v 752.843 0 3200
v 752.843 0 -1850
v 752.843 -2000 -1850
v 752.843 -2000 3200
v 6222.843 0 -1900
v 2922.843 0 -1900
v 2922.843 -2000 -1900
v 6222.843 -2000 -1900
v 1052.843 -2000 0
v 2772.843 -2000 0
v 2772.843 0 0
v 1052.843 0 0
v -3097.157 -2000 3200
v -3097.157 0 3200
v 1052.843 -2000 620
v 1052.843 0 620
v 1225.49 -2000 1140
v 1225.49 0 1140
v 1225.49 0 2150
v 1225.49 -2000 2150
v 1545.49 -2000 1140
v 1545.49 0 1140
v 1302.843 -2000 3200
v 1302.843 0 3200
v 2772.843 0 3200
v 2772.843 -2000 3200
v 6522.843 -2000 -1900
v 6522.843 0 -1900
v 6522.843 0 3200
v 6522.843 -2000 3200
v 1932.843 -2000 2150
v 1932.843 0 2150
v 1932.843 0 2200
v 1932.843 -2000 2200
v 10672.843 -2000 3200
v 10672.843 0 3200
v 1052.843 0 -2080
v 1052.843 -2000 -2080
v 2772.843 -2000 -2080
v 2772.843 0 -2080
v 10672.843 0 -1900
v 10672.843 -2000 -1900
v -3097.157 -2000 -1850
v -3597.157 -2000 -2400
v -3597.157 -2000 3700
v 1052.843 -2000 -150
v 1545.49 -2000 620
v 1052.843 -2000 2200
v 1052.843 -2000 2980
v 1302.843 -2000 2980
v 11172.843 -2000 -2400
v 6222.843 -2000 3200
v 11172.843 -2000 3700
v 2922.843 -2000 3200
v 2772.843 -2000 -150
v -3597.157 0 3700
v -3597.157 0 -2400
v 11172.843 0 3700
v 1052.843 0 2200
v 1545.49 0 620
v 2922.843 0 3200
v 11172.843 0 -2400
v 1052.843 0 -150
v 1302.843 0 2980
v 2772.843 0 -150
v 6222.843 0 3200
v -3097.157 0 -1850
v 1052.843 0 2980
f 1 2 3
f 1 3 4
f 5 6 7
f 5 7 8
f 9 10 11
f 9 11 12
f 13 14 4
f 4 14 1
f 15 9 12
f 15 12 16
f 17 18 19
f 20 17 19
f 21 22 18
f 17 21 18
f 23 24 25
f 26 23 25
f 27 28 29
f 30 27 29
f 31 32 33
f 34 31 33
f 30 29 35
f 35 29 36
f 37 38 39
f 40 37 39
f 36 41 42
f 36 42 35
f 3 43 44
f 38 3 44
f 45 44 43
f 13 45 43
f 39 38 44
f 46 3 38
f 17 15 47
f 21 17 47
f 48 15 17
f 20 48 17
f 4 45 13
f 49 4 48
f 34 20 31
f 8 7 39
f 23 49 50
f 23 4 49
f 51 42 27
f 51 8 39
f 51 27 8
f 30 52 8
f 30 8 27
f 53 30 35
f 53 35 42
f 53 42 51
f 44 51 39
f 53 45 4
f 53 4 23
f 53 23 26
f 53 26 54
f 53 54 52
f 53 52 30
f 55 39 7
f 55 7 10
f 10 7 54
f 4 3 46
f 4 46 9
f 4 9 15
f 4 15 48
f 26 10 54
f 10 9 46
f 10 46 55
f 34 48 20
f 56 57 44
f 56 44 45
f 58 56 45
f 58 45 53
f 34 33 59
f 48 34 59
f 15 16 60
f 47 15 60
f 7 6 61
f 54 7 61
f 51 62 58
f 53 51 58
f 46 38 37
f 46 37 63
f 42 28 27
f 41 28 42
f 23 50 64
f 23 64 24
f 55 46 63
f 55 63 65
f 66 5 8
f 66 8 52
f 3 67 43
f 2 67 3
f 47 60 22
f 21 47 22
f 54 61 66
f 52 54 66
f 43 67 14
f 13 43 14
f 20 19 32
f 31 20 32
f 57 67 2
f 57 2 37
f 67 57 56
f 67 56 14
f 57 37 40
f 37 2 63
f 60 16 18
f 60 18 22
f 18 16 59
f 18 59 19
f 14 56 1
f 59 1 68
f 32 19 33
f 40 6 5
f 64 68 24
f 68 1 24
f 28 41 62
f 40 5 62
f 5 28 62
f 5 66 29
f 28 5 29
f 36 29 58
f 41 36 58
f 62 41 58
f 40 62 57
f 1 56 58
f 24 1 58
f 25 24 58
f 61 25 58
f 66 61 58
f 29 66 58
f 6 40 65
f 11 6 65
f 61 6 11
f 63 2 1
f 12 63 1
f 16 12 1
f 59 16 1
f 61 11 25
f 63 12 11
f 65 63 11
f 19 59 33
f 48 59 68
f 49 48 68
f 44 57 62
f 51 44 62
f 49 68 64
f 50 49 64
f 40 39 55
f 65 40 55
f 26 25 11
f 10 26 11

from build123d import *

# Parameters (mm, degrees)
F0_W     = 14770
F0_H     = 6100
F0_W_2   = 1720
F0_H_2   = 1930
F0_W_3   = 3850
F0_H_3   = 5050
F0_W_4   = 3300
F0_H_4   = 5100
F0_W_5   = 4150
F1_DEPTH = 2000


with BuildPart() as f1:
    # F0 (on Front) → F1 (new body)
    with BuildSketch(Plane.XZ):
        with Locations((3787.843182, 650)):
            Rectangle(F0_W, F0_H)
        with Locations((1912.843182, -1115)):
            Rectangle(F0_W_2, F0_H_2, mode=Mode.SUBTRACT)
        with Locations((-1172.156818, 675)):
            Rectangle(F0_W_3, F0_H_3, mode=Mode.SUBTRACT)
        Polygon((2772.843182, 0), (1052.843182, 0), (1052.843182, 620), (1545.490212, 620), (1545.490212, 1140), (1225.490212, 1140), (1225.490212, 2150), (1932.843182, 2150), (1932.843182, 2200), (1052.843182, 2200), (1052.843182, 2980), (1302.843182, 2980), (1302.843182, 3200), (2772.843182, 3200), align=None, mode=Mode.SUBTRACT)
        with Locations((4572.843182, 650)):
            Rectangle(F0_W_4, F0_H_4, mode=Mode.SUBTRACT)
        with Locations((8597.843182, 650)):
            Rectangle(F0_W_5, F0_H_4, mode=Mode.SUBTRACT)
    extrude(amount=F1_DEPTH)


solid = f1.part
